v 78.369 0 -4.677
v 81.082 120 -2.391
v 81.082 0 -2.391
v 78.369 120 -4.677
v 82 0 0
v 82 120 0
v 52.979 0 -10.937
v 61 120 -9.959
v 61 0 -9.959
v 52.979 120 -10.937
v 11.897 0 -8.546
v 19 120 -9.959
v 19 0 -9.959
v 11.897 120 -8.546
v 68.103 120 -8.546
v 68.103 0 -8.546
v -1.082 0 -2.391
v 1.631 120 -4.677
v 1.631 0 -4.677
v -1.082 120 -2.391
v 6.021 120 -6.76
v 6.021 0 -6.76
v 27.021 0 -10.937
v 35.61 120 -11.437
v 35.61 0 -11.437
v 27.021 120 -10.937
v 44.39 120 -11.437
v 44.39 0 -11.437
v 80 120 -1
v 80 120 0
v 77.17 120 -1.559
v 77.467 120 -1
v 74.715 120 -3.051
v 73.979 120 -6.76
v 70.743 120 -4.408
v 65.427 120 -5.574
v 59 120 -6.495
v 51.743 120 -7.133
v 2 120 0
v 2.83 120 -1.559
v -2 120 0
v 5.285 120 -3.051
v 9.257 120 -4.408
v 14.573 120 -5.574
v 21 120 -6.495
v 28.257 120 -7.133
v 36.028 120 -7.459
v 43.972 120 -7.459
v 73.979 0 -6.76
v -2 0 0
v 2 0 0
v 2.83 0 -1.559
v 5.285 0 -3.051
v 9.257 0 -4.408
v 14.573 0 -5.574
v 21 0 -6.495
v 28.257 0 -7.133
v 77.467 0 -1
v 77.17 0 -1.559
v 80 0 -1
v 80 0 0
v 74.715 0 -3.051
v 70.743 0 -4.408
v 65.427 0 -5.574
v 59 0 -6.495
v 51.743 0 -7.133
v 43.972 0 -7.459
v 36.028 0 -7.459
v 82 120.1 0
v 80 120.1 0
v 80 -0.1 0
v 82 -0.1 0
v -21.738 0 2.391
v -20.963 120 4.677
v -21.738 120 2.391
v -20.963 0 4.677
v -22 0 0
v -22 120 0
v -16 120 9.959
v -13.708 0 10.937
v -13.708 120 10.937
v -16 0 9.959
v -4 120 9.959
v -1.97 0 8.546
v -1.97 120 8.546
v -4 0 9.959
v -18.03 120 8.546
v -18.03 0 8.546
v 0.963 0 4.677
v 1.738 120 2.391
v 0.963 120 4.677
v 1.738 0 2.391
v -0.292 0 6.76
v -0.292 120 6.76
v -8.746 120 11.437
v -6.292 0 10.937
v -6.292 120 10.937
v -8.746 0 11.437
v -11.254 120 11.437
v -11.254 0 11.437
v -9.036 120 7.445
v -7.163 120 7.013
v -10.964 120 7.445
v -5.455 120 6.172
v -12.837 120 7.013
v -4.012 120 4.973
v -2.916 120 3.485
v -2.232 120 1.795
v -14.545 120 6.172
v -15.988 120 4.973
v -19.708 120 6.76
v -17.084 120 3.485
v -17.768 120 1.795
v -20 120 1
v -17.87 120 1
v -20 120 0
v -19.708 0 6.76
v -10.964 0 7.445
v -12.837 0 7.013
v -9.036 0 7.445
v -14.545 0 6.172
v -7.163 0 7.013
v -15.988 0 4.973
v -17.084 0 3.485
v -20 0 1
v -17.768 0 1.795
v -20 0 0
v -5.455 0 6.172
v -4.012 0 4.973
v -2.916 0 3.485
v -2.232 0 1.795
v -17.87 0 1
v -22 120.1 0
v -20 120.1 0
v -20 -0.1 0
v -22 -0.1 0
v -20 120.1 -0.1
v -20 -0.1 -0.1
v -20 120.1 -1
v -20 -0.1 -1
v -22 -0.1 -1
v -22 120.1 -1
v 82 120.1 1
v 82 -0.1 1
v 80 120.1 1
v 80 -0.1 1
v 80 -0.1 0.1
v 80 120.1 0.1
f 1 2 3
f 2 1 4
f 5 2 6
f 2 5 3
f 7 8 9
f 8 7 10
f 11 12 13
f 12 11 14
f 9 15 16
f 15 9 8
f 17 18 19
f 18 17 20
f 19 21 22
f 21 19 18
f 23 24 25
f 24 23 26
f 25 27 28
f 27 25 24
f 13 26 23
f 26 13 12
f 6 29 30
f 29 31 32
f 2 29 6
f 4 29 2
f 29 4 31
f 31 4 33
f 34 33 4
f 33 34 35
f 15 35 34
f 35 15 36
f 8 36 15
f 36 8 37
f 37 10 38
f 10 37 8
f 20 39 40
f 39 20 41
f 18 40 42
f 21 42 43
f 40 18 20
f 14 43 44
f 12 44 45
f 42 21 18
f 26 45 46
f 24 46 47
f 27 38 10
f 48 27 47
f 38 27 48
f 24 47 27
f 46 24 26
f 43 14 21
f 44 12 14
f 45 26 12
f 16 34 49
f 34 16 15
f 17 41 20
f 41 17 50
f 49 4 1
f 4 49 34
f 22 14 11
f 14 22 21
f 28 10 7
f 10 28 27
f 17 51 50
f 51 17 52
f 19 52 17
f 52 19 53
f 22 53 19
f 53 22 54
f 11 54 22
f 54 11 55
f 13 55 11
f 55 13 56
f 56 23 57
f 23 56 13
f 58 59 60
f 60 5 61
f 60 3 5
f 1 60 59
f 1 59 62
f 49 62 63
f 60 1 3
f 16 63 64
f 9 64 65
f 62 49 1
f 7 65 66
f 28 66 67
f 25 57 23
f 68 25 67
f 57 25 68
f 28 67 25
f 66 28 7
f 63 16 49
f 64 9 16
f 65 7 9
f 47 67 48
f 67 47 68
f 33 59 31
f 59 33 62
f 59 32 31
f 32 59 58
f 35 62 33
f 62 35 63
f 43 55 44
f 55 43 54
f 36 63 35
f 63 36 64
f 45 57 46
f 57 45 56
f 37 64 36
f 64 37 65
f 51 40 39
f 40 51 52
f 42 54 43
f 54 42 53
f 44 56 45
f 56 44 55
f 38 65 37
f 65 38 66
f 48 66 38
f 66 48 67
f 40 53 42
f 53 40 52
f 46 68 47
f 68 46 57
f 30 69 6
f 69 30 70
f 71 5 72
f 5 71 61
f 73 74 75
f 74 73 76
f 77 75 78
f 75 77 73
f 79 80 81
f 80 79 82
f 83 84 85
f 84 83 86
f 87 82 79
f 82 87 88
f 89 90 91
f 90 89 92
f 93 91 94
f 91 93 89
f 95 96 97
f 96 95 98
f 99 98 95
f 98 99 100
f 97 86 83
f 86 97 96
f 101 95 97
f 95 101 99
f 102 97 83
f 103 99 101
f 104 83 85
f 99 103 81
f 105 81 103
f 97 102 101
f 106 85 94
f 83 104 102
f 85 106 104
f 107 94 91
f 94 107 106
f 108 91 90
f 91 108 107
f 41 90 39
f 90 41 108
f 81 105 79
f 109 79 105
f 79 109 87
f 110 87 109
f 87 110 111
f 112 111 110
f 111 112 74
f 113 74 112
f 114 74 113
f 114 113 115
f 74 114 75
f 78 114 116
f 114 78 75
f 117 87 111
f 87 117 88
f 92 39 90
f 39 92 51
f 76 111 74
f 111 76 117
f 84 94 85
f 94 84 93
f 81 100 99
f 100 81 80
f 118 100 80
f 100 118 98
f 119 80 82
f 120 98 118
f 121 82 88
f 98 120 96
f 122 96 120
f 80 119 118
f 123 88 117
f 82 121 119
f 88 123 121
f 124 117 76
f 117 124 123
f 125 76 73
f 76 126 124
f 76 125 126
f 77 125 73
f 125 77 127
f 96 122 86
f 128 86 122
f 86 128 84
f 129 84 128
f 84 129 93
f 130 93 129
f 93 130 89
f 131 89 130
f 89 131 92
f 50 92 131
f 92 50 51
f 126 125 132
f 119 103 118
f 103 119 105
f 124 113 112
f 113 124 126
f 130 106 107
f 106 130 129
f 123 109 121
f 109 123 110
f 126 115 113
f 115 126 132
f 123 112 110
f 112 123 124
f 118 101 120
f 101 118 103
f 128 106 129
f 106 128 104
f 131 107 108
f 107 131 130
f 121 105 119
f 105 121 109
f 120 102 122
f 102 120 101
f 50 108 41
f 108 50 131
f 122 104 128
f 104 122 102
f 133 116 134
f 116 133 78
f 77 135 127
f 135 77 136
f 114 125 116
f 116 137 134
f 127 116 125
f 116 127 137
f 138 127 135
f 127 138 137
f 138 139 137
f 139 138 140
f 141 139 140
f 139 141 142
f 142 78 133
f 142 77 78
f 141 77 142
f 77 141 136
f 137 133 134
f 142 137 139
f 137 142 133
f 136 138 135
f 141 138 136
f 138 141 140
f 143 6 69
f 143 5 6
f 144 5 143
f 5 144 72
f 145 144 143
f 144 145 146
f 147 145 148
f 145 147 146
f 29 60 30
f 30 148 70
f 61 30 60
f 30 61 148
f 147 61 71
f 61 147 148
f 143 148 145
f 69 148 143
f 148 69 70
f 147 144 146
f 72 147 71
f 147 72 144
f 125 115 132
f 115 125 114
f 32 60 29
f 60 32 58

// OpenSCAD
// Spline: piece that runs horizonal on the roof.  The tile lips grip this to stay on the roof.

// Spline width.
spline_w = 12.5;

// Spline height above the flat surface of the roof.  This is how much the tiles can grip.
spline_h = 12.5; 

// Gap between each spline.  This should be shorter than the tiles.
spline_gap = 75;

// Height of surface beneath splines.  Used for visualzaion.
surface_h = 1;

pad = 0.1;
padd = pad*2;

module surface(x, y) {
    color("cyan")
    translate([0,0,-surface_h])
    cube([x,y,surface_h]);
}

module spline(width){
    cube([width,spline_w,spline_h]);
}

module splines(x, y) {
    surface(x, y);
    for(n=[0:spline_gap:y]) {
        translate([0,n,0])
        spline(x);
    }
}


//splines(400,spline_gap*4);


module curve(x,y,z,wall) {
    difference() {
        // outer big circle
        scale([1,1,(z+wall*2)/(x+wall)])
        translate([x/2,0,0])
        rotate([-90,0,0])
        cylinder(d=x+wall, h=y); 
        
        // cut out inside
        translate([0,-pad,0])
        scale([1,1,z/(x-wall)])
        translate([x/2,0,0])
        rotate([-90,0,0])
        cylinder(d=x-wall, h=y+padd); 

        // cut off one half
        translate([-pad-wall/2,-pad,0])
        cube([x+wall+padd,y+padd,z+padd]);
   }
}

// Ridge: Convex portion of a tile.
// Valley: Concave portion of a tile.

// Width of the tile.  Actual width will be tile width plus tile wall.
tile_x = 100;

// How long the tile is hanging down the roof.
tile_overlap_y = 20;
tile_y = 100;
tile_max_y = tile_y + tile_overlap_y;

// How thick the tile is in profile.
tile_wall = 4;

// Distance from inside arc of the ridge to inside surface of valley.
tile_z = 30;

// What percentage of tile x belongs to the ridge.
tile_ridge_width_ratio=0.2;
tile_ridge_x = tile_x * tile_ridge_width_ratio;
tile_ridge_x1 = tile_x * tile_ridge_width_ratio;
tile_valley_x = tile_x - tile_ridge_x;

// What percentage of tile overall thickness belongs to the ridge.
tile_ridge_height_ratio=0.5;
tile_ridge_z = tile_z * tile_ridge_height_ratio;
tile_valley_z = tile_z - tile_ridge_z;

lock_x=tile_wall/2;
lock_y=tile_max_y+padd;
lock_z=tile_wall/4;



module lip_lock(x,y,z) {
    translate([0,-pad,0])
    cube([x/2,y+padd,z/2]);
    translate([-x/2,-pad,-z/2])
    cube([x/2,y+padd,z/2]);
}

module tile_positive(){
    curve(tile_valley_x,tile_max_y,tile_valley_z,tile_wall);
    rotate([0,180,0])
    curve(tile_ridge_x,tile_max_y,tile_ridge_z,tile_wall);


    // ridge positive lock
    translate([-tile_ridge_x-lock_x,-pad,-lock_z])
    cube([lock_x,lock_y,lock_z]);

    // valley positive lock
    translate([tile_valley_x,-pad,0])
    cube([lock_x,lock_y,lock_z]);
}

module tile() {
    difference() {
        tile_positive();

        // ridge negative lock
        translate([-tile_ridge_x,-pad,-pad])
        cube([lock_x*2,lock_y,lock_z+pad]);

        // valley negative lock
        translate([tile_valley_x-lock_x*2,-pad,-lock_z])
        cube([lock_x*2,lock_y,lock_z+pad]);
    }
}

tile();
